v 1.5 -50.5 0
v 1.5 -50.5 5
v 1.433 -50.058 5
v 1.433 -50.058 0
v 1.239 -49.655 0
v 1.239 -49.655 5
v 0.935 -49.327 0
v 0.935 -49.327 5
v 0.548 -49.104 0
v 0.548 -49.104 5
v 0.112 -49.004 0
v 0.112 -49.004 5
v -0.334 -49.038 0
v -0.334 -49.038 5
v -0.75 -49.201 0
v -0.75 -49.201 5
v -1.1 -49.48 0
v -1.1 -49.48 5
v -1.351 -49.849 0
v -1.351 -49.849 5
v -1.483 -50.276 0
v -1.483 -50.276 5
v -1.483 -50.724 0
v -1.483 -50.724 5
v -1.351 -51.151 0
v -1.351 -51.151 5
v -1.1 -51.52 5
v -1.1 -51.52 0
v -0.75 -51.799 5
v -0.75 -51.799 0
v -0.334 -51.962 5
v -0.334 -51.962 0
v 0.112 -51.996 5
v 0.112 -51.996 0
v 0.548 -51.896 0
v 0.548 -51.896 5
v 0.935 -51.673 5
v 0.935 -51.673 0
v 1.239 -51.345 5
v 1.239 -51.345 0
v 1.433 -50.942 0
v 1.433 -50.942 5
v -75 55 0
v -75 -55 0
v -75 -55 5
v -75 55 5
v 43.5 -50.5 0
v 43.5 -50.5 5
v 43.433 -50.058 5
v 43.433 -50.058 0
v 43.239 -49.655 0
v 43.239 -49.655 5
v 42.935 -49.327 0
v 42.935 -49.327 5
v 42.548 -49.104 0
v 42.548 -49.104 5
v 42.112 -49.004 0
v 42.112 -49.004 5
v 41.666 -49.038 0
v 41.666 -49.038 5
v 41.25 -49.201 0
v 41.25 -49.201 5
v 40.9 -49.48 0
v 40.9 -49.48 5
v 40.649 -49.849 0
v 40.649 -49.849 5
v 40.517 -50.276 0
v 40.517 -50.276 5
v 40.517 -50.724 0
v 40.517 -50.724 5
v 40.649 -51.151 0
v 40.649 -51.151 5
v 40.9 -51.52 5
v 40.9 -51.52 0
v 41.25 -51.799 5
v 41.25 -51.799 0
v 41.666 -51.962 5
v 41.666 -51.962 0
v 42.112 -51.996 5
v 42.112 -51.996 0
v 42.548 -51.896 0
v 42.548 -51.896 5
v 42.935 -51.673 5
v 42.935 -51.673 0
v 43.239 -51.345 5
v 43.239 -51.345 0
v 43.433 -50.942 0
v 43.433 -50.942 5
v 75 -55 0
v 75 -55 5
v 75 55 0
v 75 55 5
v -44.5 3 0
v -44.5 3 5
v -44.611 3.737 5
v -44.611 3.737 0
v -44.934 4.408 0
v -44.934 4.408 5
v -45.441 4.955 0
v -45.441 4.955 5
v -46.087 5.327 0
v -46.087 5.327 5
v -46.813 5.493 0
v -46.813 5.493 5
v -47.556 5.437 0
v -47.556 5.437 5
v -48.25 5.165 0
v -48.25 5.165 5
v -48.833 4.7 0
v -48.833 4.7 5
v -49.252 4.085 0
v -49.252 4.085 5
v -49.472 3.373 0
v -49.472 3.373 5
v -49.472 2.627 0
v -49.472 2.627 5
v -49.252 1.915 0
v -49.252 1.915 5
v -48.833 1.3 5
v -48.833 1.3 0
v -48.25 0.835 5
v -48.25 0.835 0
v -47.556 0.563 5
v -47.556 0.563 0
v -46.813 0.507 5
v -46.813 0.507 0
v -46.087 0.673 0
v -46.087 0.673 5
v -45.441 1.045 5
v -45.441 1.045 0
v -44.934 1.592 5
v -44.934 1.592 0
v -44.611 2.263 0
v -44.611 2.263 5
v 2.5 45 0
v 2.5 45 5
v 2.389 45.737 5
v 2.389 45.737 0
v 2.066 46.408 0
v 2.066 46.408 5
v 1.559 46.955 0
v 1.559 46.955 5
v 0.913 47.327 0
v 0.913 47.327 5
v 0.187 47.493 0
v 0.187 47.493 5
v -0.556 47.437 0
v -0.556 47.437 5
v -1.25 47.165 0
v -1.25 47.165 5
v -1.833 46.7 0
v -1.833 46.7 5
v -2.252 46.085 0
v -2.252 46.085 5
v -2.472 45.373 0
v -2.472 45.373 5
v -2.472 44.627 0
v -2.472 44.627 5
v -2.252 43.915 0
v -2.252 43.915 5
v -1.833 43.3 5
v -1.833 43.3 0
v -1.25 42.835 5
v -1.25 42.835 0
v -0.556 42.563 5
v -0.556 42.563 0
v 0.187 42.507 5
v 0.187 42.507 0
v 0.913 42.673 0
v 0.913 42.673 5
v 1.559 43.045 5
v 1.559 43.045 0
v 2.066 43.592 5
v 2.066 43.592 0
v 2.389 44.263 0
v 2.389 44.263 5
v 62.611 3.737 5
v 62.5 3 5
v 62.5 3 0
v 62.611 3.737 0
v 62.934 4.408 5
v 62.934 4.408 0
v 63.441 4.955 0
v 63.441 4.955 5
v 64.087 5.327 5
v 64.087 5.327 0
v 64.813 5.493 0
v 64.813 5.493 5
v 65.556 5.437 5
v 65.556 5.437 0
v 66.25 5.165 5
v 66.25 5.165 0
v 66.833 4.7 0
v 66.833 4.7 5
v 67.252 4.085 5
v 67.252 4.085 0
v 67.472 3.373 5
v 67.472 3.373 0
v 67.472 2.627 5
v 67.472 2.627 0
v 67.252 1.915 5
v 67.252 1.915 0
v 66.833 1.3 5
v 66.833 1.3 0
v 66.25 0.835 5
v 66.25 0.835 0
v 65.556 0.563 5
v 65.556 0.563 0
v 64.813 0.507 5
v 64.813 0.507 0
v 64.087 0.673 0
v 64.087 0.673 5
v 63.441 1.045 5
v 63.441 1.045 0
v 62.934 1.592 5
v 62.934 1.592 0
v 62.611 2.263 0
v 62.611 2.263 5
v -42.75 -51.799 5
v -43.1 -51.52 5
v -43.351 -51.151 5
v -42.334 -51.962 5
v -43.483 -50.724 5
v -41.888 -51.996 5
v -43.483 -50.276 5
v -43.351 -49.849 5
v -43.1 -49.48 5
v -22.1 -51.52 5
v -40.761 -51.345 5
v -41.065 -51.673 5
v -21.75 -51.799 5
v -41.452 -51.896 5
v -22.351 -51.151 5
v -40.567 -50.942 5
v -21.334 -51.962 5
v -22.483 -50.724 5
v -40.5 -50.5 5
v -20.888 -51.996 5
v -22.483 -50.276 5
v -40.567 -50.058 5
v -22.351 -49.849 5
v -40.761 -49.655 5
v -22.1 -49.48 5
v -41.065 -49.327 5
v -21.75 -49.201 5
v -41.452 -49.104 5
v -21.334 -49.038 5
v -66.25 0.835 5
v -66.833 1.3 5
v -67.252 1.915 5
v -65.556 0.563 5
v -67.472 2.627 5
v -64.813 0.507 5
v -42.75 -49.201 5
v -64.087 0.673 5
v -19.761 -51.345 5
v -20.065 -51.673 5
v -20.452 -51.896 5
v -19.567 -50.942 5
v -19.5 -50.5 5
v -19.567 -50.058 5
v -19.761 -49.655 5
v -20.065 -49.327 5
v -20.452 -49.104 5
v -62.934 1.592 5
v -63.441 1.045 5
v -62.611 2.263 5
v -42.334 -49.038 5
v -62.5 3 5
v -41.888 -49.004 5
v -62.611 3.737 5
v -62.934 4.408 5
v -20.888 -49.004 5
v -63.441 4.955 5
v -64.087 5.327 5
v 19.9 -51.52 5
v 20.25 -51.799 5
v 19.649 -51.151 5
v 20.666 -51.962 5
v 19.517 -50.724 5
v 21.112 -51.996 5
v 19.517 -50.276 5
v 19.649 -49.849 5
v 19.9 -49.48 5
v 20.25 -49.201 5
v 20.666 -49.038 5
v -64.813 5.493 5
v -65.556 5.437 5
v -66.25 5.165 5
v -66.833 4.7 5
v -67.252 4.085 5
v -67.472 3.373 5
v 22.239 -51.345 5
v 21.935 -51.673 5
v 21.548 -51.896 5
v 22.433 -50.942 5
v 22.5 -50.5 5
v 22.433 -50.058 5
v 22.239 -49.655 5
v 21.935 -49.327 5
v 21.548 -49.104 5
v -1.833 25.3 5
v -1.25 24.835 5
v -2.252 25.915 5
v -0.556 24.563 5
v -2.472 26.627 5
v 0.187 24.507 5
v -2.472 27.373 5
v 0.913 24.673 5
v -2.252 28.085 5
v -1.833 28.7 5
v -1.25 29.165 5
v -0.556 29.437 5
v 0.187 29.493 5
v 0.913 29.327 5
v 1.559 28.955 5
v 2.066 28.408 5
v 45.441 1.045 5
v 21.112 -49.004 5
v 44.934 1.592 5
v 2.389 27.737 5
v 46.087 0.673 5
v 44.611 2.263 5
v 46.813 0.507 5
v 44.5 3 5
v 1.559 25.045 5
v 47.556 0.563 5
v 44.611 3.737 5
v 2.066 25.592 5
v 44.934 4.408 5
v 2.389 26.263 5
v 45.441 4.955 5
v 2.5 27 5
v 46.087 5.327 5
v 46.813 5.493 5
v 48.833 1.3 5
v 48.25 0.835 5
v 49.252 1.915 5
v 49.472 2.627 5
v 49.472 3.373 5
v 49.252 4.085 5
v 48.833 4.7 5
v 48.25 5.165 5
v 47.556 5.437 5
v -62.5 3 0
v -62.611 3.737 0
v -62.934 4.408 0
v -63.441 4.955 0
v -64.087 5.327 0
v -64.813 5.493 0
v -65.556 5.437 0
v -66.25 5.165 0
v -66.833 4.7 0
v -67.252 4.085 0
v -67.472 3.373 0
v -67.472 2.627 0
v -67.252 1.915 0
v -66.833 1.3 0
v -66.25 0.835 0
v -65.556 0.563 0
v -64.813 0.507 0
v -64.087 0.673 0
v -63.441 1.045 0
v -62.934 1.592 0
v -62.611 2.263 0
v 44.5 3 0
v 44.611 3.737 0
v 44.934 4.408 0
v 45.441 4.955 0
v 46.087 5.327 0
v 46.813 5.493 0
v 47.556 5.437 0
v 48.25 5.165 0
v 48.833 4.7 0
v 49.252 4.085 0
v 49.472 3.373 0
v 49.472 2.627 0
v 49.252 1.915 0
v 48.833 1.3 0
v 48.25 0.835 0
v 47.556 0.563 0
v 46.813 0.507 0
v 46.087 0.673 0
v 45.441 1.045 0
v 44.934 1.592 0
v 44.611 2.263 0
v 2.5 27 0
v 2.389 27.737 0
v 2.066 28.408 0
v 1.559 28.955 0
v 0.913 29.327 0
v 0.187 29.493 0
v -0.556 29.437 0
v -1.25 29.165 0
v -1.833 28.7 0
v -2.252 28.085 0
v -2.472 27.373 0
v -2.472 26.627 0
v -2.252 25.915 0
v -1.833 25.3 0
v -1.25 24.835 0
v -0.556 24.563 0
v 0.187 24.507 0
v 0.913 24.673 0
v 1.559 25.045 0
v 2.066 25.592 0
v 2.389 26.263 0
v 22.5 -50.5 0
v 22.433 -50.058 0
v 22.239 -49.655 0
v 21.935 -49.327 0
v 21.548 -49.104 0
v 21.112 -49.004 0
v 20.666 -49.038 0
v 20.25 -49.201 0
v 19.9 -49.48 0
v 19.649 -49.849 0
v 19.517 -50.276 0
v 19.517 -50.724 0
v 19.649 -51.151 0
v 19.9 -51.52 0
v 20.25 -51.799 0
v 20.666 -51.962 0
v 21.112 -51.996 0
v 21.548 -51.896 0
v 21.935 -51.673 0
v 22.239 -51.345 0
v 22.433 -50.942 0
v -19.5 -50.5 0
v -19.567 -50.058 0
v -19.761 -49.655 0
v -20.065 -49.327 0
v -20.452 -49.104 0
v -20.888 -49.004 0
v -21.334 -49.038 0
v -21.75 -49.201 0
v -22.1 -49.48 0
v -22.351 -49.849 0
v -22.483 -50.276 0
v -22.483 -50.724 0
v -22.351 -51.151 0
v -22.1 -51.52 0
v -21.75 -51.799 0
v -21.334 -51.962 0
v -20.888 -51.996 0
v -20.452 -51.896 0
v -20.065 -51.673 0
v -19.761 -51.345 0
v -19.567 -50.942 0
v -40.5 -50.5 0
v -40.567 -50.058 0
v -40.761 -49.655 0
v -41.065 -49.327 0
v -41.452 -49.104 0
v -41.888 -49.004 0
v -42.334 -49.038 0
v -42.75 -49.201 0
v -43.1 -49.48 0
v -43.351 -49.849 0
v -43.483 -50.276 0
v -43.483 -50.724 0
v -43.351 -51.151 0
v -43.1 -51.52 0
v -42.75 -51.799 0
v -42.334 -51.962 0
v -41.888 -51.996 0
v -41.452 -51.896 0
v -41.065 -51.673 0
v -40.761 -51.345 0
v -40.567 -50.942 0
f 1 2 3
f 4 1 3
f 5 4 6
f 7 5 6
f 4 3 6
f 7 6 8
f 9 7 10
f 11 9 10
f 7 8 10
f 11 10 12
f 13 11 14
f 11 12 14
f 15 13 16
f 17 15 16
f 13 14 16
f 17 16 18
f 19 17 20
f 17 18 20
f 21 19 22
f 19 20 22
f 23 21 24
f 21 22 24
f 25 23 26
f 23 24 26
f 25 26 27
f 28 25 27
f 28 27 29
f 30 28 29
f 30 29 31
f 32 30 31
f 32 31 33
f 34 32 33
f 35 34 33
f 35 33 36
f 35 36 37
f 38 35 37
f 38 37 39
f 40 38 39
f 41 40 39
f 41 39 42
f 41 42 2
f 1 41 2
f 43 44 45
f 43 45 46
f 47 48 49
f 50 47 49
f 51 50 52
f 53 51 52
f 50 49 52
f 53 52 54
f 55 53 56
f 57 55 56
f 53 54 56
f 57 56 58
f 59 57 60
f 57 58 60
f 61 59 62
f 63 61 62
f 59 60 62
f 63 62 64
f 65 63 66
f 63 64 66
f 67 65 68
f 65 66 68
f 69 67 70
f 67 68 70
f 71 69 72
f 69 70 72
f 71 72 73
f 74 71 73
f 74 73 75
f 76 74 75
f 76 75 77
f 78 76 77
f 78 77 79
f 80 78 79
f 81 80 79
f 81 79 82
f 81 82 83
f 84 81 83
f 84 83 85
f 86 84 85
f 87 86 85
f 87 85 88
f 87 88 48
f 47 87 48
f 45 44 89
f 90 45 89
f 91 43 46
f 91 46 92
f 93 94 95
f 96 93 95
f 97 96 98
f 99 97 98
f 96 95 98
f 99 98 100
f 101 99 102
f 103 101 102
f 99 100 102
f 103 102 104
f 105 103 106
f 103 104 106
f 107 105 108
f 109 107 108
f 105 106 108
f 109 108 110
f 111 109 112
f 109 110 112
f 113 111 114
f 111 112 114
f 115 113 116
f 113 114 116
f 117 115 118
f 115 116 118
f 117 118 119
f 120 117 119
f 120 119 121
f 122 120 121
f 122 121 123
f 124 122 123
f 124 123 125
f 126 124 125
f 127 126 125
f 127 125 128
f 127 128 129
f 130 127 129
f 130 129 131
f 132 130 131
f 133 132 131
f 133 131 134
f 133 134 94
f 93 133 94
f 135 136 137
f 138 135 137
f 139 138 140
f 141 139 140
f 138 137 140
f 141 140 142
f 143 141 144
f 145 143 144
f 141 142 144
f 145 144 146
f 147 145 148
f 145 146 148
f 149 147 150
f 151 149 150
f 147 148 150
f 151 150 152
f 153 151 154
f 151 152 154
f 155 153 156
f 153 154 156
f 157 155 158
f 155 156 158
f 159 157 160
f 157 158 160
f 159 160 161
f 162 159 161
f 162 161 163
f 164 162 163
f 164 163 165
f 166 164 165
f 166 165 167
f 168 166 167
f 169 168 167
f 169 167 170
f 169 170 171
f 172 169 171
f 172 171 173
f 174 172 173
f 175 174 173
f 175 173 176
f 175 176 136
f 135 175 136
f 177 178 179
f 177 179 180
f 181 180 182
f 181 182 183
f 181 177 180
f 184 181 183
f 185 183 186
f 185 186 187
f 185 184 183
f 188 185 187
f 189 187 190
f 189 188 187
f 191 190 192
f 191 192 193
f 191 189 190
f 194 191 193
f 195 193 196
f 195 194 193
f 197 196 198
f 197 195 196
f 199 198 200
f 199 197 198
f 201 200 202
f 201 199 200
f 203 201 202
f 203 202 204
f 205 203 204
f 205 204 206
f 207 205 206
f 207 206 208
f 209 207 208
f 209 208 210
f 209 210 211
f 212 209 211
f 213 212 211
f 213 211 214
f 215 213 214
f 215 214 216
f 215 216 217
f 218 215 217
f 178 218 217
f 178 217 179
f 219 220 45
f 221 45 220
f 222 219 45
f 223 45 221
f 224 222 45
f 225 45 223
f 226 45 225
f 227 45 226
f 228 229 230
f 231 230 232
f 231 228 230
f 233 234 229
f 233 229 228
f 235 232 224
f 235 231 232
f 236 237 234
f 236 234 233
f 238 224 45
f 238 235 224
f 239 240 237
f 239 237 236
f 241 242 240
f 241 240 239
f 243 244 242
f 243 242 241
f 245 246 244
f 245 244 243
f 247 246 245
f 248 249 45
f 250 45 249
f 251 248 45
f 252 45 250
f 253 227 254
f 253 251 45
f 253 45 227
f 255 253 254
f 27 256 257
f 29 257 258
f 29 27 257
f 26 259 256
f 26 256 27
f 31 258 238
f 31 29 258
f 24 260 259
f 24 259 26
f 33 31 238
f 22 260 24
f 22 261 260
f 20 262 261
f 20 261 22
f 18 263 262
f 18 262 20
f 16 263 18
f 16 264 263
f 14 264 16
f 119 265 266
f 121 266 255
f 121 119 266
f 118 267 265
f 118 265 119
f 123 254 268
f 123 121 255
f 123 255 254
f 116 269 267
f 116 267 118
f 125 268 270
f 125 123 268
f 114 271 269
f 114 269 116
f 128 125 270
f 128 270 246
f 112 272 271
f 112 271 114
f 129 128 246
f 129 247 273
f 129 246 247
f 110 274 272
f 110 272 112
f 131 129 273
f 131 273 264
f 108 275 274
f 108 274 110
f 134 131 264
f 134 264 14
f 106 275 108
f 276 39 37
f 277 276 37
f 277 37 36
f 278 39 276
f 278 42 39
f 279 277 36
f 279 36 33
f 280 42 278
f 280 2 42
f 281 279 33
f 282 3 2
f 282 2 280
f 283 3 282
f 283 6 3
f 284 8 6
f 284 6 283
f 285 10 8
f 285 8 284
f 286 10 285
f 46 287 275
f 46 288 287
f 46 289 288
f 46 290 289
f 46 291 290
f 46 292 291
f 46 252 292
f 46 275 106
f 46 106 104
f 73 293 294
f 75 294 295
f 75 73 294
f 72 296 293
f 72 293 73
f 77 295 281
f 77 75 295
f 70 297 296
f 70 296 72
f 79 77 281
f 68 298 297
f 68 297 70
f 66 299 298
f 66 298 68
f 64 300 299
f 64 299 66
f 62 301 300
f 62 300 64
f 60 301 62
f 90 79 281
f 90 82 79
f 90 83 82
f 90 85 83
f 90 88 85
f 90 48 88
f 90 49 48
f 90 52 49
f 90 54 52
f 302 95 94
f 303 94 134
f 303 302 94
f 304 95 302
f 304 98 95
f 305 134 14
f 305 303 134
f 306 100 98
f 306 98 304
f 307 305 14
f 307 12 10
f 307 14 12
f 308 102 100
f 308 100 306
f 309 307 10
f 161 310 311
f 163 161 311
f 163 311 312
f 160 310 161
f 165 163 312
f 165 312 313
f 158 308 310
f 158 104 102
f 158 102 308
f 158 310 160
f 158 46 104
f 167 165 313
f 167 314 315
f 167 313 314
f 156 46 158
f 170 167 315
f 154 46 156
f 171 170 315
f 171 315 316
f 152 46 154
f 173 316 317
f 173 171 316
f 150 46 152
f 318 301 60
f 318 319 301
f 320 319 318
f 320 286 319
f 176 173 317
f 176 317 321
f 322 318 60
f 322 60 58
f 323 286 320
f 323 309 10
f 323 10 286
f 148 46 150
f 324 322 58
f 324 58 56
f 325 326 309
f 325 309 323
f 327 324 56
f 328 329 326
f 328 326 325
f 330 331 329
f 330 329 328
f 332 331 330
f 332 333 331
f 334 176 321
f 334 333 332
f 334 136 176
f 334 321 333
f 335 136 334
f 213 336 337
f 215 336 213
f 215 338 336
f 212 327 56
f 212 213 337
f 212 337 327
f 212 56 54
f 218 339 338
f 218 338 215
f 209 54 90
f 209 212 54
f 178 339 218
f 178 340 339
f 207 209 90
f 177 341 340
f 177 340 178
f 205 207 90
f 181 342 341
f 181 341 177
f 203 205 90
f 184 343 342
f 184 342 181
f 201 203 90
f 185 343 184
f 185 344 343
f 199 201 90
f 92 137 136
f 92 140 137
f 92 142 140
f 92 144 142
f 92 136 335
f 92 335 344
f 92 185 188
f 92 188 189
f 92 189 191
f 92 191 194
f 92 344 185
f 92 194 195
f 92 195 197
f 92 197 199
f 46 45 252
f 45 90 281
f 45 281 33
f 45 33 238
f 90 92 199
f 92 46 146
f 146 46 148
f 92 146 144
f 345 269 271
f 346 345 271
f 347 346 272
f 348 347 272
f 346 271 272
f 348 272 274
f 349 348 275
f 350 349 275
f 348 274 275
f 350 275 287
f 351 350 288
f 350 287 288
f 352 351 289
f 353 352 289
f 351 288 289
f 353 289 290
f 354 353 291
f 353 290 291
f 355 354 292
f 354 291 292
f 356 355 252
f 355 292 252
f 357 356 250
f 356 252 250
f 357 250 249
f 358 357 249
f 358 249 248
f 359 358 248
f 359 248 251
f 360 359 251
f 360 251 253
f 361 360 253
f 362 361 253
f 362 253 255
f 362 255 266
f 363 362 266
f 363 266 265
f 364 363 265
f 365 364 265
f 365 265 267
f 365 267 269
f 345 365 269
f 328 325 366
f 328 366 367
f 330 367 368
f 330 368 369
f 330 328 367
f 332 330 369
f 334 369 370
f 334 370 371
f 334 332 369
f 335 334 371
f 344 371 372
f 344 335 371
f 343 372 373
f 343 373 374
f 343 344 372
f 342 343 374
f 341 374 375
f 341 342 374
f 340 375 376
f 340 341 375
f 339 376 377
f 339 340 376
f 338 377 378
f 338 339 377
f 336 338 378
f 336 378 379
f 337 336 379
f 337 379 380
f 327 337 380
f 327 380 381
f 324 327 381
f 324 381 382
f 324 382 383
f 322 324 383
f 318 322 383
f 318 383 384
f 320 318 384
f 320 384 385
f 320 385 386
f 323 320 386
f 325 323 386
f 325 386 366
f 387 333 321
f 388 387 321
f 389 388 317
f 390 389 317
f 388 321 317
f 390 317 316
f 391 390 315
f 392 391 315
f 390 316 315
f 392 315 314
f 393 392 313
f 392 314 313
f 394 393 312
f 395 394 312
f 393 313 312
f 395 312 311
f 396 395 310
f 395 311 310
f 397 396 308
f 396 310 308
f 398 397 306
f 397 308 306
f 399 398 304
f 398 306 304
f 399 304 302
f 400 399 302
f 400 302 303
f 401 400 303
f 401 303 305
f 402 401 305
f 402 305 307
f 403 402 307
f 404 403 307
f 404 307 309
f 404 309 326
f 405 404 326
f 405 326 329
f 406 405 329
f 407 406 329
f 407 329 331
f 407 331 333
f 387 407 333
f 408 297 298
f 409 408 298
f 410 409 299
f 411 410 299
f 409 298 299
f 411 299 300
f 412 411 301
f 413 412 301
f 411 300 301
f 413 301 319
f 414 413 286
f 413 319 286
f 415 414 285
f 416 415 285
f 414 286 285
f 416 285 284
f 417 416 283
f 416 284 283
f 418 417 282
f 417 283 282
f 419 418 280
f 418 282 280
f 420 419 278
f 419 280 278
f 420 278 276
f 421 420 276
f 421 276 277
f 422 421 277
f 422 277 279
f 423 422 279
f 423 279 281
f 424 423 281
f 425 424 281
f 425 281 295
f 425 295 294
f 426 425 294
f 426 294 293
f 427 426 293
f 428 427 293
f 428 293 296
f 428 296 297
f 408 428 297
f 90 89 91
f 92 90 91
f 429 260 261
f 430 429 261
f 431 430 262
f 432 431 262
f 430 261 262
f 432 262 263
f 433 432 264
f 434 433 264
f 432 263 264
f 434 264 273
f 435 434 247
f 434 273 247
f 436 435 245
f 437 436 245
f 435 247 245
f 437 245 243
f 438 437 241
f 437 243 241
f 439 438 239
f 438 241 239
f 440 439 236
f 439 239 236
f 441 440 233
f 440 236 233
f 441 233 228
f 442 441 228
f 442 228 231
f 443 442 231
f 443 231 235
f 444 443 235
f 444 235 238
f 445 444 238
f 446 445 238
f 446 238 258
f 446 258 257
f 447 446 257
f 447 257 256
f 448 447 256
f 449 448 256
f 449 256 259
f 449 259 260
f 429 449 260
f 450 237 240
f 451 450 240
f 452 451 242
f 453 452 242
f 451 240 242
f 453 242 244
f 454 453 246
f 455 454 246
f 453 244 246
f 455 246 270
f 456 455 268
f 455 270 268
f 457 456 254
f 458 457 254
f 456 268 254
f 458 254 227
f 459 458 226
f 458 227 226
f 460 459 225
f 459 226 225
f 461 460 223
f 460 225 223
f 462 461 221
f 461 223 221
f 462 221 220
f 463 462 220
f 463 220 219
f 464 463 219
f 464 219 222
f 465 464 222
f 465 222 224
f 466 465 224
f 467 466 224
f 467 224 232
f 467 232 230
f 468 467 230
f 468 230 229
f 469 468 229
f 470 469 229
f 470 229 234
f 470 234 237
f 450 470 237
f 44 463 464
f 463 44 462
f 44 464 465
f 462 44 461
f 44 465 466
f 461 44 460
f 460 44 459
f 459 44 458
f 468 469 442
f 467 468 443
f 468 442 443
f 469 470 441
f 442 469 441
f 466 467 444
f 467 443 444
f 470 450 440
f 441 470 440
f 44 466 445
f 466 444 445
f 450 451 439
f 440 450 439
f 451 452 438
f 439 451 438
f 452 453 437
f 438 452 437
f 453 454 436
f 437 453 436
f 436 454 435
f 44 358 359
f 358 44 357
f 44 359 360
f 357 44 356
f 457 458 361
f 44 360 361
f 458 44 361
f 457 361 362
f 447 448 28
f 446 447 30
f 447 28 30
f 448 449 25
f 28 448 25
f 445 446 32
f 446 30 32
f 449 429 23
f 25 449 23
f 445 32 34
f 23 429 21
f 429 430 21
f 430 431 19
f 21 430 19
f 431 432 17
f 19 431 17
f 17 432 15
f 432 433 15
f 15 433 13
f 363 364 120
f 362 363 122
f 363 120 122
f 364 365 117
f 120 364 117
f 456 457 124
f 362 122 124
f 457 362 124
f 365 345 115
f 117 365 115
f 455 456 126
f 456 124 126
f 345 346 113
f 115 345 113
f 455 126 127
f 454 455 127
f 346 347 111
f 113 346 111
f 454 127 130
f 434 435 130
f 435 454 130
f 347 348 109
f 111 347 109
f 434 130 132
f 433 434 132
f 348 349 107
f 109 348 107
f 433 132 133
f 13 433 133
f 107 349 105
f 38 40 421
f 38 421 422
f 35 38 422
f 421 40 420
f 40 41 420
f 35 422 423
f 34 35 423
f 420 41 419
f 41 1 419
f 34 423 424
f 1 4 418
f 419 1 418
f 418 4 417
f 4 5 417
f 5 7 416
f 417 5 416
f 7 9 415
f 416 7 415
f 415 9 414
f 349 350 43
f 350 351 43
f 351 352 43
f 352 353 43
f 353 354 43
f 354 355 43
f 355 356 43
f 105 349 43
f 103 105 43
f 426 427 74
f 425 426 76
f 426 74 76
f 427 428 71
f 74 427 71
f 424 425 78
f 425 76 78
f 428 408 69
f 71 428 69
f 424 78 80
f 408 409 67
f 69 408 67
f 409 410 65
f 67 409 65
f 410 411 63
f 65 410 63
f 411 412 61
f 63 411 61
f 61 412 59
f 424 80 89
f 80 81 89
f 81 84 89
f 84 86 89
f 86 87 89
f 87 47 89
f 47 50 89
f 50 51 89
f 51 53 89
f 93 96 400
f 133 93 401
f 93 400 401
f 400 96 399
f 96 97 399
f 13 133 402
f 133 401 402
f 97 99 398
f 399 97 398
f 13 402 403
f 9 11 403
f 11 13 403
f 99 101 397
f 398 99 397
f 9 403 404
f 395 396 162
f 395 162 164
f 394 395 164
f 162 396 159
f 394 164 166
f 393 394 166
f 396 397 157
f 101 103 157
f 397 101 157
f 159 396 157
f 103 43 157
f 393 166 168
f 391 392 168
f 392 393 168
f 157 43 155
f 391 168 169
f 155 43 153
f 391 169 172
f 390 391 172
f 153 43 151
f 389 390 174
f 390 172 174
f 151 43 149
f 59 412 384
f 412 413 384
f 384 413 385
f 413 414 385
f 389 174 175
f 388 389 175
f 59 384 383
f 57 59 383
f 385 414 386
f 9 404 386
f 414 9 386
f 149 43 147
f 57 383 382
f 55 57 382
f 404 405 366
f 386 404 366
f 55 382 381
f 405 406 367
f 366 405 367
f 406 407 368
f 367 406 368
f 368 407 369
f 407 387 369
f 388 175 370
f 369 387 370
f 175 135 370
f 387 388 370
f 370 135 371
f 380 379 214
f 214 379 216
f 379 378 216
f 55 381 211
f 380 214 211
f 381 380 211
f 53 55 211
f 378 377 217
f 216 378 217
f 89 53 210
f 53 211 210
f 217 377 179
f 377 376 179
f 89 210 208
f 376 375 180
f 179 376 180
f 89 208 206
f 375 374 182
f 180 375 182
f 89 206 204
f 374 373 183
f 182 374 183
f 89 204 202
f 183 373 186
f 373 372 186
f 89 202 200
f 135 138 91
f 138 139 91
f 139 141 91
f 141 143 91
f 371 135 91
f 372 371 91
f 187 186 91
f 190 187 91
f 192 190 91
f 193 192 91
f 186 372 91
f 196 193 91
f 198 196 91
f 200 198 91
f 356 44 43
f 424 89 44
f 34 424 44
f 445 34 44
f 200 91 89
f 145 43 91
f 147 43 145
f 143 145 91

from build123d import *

# Parameters (mm, degrees)
SKETCH_1_W             = 150
SKETCH_1_H             = 110
EXTRUDE_1_DEPTH        = 5
CUT_EXTRUDE_1_REACH    = 95.14
SKETCH_2_R             = 1.5
PATTERN_LINEAR_1_COUNT = 5
PATTERN_LINEAR_1_PITCH = 21
CUT_EXTRUDE_2_REACH    = 95.14
SKETCH_3_R             = 2.5
CUT_EXTRUDE_3_REACH    = 95.14
SKETCH_4_R             = 2.5


with BuildPart() as part:
    # 草圖1 → 填料-伸長1 (new body)
    with BuildSketch(Plane.XY):
        Rectangle(SKETCH_1_W, SKETCH_1_H)
    extrude(amount=EXTRUDE_1_DEPTH)

    # 草圖2 → 除料-伸長1 (cut, up to next)
    with BuildSketch(Plane.XY.offset(5), mode=Mode.PRIVATE) as cut_extrude_1_sk1:
        with Locations((42, -50.5)):
            Circle(SKETCH_2_R)
    cut_extrude_1_tool1 = extrude(cut_extrude_1_sk1.sketch, amount=-CUT_EXTRUDE_1_REACH, mode=Mode.PRIVATE) & part.part
    cut_extrude_1 = cut_extrude_1_tool1.solids().sort_by_distance((42, -50.5, 5))[0]
    add(cut_extrude_1, mode=Mode.SUBTRACT)

    # 直線複製排列1: 除料-伸長1 ×5
    with Locations(*[(-i * PATTERN_LINEAR_1_PITCH, 0, 0) for i in range(1, PATTERN_LINEAR_1_COUNT)]):
        add(cut_extrude_1, mode=Mode.SUBTRACT)

    # 草圖3 → 除料-伸長2 (cut, up to next)
    with BuildSketch(Plane.XY.offset(5), mode=Mode.PRIVATE) as cut_extrude_2_sk1:
        with Locations((-65, 3)):
            Circle(SKETCH_3_R)
    cut_extrude_2_tool1 = extrude(cut_extrude_2_sk1.sketch, amount=-CUT_EXTRUDE_2_REACH, mode=Mode.PRIVATE) & part.part
    # 草圖3 → 除料-伸長2 (cut, up to next)
    with BuildSketch(Plane.XY.offset(5), mode=Mode.PRIVATE) as cut_extrude_2_sk2:
        with Locations((-47, 3)):
            Circle(SKETCH_3_R)
    cut_extrude_2_tool2 = extrude(cut_extrude_2_sk2.sketch, amount=-CUT_EXTRUDE_2_REACH, mode=Mode.PRIVATE) & part.part
    cut_extrude_2_1 = cut_extrude_2_tool1.solids().sort_by_distance((-65, 3, 5))[0]
    add(cut_extrude_2_1, mode=Mode.SUBTRACT)
    cut_extrude_2_2 = cut_extrude_2_tool2.solids().sort_by_distance((-47, 3, 5))[0]
    add(cut_extrude_2_2, mode=Mode.SUBTRACT)
    cut_extrude_2 = cut_extrude_2_1 + cut_extrude_2_2  # 除料-伸長2 as one shape, for the pattern or mirror that repeats it

    # 鏡射1: 除料-伸長2 across plane
    add(cut_extrude_2.mirror(Plane(origin=(0, 0, 0), x_dir=(0, 0, 1), z_dir=(1, 0, 0))), mode=Mode.SUBTRACT)

    # 草圖4 → 除料-伸長3 (cut, up to next)
    with BuildSketch(Plane.XY.offset(5), mode=Mode.PRIVATE) as cut_extrude_3_sk1:
        with Locations((0, 45)):
            Circle(SKETCH_4_R)
    cut_extrude_3_tool1 = extrude(cut_extrude_3_sk1.sketch, amount=-CUT_EXTRUDE_3_REACH, mode=Mode.PRIVATE) & part.part
    # 草圖4 → 除料-伸長3 (cut, up to next)
    with BuildSketch(Plane.XY.offset(5), mode=Mode.PRIVATE) as cut_extrude_3_sk2:
        with Locations((0, 27)):
            Circle(SKETCH_4_R)
    cut_extrude_3_tool2 = extrude(cut_extrude_3_sk2.sketch, amount=-CUT_EXTRUDE_3_REACH, mode=Mode.PRIVATE) & part.part
    add(cut_extrude_3_tool1.solids().sort_by_distance((0, 45, 5))[0], mode=Mode.SUBTRACT)
    add(cut_extrude_3_tool2.solids().sort_by_distance((0, 27, 5))[0], mode=Mode.SUBTRACT)


solid = part.part
